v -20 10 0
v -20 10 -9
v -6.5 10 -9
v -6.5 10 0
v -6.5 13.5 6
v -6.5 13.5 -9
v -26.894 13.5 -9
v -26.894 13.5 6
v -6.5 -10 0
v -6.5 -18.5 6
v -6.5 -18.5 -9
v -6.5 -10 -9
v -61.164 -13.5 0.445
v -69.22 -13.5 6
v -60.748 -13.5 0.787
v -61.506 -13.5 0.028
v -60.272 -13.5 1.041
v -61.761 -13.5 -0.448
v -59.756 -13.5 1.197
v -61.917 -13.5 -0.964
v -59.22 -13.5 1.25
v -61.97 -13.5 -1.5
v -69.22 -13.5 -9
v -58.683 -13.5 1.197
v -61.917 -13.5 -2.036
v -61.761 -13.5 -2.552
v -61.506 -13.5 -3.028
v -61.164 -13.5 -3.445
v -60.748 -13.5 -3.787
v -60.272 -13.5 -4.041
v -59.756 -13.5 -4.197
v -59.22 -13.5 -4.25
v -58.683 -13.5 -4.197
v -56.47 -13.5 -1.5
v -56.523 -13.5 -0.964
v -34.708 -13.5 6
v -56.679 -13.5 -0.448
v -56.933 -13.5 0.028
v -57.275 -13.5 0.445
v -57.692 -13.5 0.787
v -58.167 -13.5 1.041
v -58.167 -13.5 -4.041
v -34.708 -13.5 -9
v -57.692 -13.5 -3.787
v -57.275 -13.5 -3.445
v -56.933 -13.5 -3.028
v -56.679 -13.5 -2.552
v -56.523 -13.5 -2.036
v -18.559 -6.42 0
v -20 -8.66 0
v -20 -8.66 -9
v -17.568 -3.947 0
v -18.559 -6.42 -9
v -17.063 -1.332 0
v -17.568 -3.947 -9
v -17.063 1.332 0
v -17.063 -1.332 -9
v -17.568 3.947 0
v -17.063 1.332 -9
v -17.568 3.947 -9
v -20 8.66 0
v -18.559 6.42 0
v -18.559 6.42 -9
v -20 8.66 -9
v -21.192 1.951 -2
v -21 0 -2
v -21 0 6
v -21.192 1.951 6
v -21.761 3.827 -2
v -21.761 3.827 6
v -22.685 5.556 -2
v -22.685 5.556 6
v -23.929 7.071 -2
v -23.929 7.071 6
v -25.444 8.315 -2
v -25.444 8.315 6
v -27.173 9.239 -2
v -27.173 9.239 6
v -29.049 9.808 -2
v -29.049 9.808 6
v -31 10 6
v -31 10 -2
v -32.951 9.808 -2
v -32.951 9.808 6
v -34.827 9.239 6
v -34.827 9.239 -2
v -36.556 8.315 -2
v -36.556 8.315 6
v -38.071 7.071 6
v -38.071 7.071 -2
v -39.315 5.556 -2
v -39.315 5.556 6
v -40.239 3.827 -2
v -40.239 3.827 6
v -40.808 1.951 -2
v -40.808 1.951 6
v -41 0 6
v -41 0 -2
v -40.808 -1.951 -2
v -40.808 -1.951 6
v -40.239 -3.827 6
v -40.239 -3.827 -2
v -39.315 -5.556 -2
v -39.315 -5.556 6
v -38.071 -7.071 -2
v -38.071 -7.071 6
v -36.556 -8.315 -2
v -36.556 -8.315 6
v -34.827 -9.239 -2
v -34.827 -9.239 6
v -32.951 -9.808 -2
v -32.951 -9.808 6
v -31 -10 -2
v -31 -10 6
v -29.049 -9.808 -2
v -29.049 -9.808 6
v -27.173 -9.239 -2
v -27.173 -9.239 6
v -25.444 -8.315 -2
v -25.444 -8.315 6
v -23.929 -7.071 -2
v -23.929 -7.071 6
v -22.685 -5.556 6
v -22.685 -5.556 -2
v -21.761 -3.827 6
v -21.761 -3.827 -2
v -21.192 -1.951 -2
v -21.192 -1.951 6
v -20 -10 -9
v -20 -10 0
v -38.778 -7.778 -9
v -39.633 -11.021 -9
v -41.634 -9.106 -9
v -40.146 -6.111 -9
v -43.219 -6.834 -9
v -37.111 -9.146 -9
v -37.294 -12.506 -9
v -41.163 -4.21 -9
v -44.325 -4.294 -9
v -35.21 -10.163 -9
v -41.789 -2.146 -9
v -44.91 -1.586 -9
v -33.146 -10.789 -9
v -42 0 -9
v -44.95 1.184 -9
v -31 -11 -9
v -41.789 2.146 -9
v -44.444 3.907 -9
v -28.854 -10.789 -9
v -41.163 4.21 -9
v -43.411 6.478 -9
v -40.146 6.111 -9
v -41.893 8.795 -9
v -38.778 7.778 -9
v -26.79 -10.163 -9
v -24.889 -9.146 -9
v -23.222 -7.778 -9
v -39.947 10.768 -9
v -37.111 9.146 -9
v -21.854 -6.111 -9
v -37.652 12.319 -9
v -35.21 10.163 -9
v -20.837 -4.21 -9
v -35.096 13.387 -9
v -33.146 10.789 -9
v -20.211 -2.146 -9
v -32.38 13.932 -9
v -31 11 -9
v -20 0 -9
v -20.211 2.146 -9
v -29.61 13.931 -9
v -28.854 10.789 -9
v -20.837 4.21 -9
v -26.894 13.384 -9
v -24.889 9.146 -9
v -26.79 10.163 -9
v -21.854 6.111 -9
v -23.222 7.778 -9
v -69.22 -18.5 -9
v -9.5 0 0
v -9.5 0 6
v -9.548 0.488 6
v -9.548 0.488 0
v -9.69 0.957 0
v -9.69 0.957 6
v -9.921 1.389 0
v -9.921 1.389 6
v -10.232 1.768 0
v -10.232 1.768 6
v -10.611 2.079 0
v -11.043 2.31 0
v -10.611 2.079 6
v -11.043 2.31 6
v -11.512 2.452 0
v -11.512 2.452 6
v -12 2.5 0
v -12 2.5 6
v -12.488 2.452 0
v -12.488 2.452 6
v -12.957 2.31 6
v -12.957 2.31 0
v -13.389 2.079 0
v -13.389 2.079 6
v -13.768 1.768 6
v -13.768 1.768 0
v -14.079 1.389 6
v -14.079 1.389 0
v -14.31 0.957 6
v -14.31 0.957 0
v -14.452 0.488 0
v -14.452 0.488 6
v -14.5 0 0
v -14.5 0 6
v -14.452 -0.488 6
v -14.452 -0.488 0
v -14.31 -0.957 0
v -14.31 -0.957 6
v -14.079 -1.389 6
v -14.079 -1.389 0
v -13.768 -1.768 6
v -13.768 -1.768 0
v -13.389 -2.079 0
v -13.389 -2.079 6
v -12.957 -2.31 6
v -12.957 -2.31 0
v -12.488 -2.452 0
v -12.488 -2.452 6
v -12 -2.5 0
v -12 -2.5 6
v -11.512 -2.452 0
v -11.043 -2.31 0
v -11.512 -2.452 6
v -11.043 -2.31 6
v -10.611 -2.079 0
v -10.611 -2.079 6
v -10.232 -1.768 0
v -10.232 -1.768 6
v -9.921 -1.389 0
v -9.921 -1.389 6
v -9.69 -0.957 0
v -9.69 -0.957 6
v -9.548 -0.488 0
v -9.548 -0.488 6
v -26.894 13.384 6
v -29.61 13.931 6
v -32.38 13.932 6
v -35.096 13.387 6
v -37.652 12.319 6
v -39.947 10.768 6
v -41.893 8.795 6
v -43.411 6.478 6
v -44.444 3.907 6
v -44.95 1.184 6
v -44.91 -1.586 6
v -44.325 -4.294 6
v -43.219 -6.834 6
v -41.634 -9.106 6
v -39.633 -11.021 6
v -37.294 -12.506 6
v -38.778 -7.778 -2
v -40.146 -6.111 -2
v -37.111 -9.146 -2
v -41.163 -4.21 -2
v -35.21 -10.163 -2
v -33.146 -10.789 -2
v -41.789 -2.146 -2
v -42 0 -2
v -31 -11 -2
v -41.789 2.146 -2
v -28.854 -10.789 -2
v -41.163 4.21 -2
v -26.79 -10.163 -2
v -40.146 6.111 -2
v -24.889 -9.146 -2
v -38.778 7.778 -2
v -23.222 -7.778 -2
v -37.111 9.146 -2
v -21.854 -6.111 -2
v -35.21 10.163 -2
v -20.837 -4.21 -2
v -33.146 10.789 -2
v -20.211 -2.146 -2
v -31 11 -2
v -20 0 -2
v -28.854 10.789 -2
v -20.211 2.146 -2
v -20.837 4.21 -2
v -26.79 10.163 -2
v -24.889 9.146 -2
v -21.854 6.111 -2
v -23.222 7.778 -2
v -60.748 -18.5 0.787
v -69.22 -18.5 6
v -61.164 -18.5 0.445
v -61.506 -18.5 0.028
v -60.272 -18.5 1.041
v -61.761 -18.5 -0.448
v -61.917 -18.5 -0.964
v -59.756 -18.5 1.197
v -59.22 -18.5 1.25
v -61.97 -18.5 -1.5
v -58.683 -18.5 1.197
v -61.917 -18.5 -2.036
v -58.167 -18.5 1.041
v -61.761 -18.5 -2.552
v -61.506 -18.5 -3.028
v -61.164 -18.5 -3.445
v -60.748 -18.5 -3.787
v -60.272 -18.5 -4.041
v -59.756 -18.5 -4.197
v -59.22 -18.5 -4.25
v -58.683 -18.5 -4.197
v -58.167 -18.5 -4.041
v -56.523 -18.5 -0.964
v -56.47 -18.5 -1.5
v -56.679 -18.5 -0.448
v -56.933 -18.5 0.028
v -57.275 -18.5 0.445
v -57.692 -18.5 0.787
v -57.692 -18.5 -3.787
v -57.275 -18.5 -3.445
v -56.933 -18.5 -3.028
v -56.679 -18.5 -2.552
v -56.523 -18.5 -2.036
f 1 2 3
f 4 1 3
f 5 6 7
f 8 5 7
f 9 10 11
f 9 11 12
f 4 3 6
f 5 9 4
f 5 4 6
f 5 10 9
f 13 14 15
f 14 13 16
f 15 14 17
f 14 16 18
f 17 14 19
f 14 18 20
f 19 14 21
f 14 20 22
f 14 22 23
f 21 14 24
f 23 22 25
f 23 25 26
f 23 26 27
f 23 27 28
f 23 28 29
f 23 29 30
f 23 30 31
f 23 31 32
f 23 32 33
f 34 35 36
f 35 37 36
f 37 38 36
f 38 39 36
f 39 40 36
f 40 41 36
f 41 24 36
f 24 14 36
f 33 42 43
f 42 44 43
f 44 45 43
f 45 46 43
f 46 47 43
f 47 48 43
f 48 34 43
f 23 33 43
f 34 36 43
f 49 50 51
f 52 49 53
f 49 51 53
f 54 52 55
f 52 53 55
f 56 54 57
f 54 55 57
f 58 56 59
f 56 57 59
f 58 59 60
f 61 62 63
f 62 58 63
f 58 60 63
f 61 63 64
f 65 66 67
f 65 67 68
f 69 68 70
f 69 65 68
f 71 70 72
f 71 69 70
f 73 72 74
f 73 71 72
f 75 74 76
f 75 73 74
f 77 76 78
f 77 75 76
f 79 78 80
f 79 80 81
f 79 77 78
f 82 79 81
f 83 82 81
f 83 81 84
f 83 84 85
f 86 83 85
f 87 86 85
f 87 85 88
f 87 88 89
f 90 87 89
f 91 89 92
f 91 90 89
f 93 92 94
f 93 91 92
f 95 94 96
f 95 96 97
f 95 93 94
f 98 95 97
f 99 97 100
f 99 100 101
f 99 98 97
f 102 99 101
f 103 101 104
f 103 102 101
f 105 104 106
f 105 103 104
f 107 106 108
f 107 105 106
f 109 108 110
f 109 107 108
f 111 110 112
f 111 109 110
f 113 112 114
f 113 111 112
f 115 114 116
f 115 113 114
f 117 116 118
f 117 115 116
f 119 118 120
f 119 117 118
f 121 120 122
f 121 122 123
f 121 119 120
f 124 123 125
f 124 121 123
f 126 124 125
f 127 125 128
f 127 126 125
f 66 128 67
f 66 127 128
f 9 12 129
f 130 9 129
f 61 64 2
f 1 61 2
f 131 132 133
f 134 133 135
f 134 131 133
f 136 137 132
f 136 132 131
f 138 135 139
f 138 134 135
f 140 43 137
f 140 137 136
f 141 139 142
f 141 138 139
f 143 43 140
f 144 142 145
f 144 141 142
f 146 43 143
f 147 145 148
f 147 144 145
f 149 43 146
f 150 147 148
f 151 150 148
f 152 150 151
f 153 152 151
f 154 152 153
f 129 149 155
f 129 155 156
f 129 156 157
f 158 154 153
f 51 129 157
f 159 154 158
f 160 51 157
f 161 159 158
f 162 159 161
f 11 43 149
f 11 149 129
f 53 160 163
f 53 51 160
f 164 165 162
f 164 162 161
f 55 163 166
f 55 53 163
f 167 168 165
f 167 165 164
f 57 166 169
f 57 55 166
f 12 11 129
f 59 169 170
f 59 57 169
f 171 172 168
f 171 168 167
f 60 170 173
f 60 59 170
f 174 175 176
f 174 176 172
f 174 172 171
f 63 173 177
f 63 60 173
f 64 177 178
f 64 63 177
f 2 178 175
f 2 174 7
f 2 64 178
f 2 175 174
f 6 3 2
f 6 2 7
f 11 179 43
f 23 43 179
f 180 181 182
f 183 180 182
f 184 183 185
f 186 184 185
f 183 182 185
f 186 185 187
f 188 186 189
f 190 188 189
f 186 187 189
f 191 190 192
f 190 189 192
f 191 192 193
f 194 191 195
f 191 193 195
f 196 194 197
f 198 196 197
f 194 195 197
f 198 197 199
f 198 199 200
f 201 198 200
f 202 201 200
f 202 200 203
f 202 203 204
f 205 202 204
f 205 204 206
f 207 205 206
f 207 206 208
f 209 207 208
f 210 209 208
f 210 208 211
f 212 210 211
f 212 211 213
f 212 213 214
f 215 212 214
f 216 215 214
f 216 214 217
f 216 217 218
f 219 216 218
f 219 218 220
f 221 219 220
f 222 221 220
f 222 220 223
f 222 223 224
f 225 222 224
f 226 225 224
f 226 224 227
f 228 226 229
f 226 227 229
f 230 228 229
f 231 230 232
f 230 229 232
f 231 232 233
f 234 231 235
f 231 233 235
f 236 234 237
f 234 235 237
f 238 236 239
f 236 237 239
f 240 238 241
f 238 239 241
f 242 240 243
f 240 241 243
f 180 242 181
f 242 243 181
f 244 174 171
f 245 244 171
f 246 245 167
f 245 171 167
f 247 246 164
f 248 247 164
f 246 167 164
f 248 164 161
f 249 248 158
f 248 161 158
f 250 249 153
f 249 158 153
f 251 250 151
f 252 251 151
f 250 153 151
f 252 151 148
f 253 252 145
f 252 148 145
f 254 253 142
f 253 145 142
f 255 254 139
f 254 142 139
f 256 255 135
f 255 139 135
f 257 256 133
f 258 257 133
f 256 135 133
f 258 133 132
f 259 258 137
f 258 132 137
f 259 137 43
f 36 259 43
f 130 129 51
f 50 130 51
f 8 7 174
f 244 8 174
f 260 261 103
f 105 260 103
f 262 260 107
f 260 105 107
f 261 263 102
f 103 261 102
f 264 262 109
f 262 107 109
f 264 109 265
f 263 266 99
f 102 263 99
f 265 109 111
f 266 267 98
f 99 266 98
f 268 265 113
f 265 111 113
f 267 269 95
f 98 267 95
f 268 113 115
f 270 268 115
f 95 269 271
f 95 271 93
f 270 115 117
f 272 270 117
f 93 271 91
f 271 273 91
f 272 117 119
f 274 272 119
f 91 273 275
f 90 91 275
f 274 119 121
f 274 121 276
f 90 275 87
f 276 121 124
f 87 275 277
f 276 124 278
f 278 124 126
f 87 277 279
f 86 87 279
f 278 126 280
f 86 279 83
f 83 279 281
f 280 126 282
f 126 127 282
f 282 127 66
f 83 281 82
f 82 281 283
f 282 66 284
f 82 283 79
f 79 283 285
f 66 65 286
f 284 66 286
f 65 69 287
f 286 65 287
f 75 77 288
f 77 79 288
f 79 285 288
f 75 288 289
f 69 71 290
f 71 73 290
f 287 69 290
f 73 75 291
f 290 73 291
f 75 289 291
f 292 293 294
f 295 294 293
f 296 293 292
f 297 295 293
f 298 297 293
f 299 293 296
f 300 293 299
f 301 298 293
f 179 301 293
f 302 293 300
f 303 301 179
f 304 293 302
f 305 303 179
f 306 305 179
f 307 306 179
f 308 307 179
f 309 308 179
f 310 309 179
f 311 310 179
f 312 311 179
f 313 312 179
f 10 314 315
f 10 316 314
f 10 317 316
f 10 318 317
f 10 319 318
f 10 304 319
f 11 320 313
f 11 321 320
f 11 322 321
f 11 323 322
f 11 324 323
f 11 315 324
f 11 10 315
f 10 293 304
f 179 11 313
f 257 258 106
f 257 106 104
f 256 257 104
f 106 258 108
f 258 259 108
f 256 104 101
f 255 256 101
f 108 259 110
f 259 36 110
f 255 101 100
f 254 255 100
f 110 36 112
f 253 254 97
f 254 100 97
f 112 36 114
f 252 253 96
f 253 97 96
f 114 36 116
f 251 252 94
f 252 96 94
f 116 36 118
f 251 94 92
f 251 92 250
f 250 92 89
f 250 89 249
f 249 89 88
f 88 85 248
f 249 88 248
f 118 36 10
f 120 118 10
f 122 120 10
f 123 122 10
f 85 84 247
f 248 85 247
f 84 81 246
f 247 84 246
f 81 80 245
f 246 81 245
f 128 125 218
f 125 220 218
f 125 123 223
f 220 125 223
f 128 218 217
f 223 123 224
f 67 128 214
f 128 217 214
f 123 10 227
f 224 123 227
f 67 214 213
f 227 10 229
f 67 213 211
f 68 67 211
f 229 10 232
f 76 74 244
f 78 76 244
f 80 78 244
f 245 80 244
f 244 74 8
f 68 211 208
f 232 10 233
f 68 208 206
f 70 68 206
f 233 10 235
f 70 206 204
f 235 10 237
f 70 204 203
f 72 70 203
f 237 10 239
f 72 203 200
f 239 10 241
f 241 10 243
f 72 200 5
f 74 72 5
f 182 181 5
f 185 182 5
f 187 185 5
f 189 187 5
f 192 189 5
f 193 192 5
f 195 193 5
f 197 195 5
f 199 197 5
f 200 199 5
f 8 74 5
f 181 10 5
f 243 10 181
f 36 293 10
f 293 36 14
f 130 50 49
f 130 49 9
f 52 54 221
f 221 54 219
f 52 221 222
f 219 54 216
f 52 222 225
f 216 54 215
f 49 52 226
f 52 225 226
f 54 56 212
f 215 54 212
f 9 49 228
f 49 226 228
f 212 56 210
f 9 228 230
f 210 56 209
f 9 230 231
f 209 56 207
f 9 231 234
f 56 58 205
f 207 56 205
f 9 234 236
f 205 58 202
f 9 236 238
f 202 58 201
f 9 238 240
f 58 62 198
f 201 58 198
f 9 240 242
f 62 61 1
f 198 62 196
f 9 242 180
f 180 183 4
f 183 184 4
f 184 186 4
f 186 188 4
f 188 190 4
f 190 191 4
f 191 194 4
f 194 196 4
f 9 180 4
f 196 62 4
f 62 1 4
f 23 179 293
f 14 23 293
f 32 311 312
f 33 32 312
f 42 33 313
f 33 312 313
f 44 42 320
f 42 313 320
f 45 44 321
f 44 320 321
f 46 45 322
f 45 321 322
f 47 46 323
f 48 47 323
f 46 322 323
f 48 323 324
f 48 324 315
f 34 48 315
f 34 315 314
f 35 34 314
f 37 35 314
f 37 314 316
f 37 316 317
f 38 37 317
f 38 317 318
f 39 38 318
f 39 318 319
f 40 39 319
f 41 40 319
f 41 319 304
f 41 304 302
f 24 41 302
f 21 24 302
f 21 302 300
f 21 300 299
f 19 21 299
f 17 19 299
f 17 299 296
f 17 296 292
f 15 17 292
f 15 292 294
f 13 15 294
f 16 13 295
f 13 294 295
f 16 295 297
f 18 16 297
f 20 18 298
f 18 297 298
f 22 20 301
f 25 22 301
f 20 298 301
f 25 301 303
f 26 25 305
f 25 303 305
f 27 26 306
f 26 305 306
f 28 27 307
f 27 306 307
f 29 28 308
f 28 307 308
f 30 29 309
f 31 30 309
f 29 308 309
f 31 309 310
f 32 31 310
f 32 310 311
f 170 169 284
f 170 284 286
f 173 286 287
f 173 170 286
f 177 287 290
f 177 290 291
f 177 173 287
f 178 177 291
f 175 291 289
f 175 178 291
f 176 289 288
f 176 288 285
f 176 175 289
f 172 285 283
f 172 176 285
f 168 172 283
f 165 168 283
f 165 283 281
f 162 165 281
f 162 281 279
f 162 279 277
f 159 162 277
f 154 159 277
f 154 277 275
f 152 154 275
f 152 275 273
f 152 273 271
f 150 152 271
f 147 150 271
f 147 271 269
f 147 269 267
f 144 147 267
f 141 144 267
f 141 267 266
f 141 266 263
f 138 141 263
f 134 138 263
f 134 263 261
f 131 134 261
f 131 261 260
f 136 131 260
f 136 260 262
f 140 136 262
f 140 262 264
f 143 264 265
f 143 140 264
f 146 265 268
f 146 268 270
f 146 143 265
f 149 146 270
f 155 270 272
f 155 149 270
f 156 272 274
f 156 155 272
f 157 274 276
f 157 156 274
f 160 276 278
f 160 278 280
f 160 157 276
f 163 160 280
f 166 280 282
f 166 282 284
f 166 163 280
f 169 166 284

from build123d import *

# Parameters (mm, degrees)
SKETCH_1_W          = 40
SKETCH_1_H          = 20
EXTRUDE_1_DEPTH     = 6
SKETCH_2_R          = 2.5
CUT_EXTRUDE_1_DEPTH = 24.151673806
EXTRUDE_START       = -15
EXTRUDE_2_OUTLINE_R = 11
EXTRUDE_2_DEPTH     = 15
EXTRUDE_START_2     = -8
SKETCH_5_R          = 11
SKETCH_5_R_2        = 10
EXTRUDE_3_DEPTH     = 8
SKETCH_10_W         = 15
SKETCH_10_H         = 5
EXTRUDE_4_DEPTH     = 500
SKETCH_11_W         = 11.491200589
SKETCH_11_H         = 5.122583395
EXTRUDE_5_DEPTH     = 15
SKETCH_12_W         = 26.5
SKETCH_12_H         = 32
CUT_EXTRUDE_2_DEPTH = 481.59052217
SKETCH_14_W         = 424.807672393
SKETCH_14_H         = 21.861471412
CUT_EXTRUDE_3_DEPTH = 482.183177179
SKETCH_15_R         = 2.75
CUT_EXTRUDE_4_DEPTH = 10


# Read off the part's stored shape, not the designer's step: 凸台-拉伸2
with BuildPart() as part:
    # 草图1 → 凸台-拉伸1 (new body)
    with BuildSketch(Plane.XY):
        Rectangle(SKETCH_1_W, SKETCH_1_H)
    extrude(amount=EXTRUDE_1_DEPTH)

    # 草图2 → 切除-拉伸1 (cut, through all)
    with BuildSketch(Plane.XY.offset(6)):
        with Locations((10, 0)):
            Circle(SKETCH_2_R)
        with Locations((-1, 0)):
            Circle(SKETCH_2_R)
        with Locations((-12, 0)):
            Circle(SKETCH_2_R)
    extrude(amount=-CUT_EXTRUDE_1_DEPTH, mode=Mode.SUBTRACT)

    # 凸台-拉伸2 outline → 凸台-拉伸2 (add)
    with BuildSketch(Plane.XY.offset(6).offset(EXTRUDE_START)):
        with BuildLine():
            Line((20, 10), (20, 13.5))
            Line((20, 13.5), (-26.893967141, 13.5))
            Line((-26.893967141, 13.5), (-26.893967141, 13.384337644))
            ThreePointArc((-26.893967141, 13.384337644), (-45, 0), (-26.893967141, -13.384337644))
            Line((-26.893967141, -13.384337644), (-26.893967141, -13.5))
            Line((-26.893967141, -13.5), (20, -13.5))
            Line((20, -13.5), (20, -10))
            Line((20, -10), (-20, -10))
            Line((-20, -10), (-20, -8.660254038))
            ThreePointArc((-20, -8.660254038), (-17, 0), (-20, 8.660254038))
            Line((-20, 8.660254038), (-20, 10))
            Line((-20, 10), (20, 10))
        make_face()
        with Locations((-31, 0)):
            Circle(EXTRUDE_2_OUTLINE_R, mode=Mode.SUBTRACT)
    extrude(amount=EXTRUDE_2_DEPTH)

    # 草图5 → 凸台-拉伸3 (add)
    with BuildSketch(Plane.XY.offset(6).offset(EXTRUDE_START_2)):
        with Locations((-31, 0)):
            Circle(SKETCH_5_R)
        with Locations((-31, 0)):
            Circle(SKETCH_5_R_2, mode=Mode.SUBTRACT)
    extrude(amount=EXTRUDE_3_DEPTH)

    # 草图10 → 凸台-拉伸4 (add)
    with BuildSketch(Plane(origin=(20, 0, 0), x_dir=(0, 0, -1), z_dir=(1, 0, 0))):
        with Locations((1.5, -16)):
            Rectangle(SKETCH_10_W, SKETCH_10_H)
    extrude(amount=-EXTRUDE_4_DEPTH)

    # 草图11 → 凸台-拉伸5 (add, through all)
    with BuildSketch(Plane(origin=(0, 0, -9), x_dir=(-1, 0, 0), z_dir=(0, 0, -1))):
        with Locations((27.78271332, -13.925059853)):
            Rectangle(SKETCH_11_W, SKETCH_11_H)
    extrude(amount=-EXTRUDE_5_DEPTH)

    # 草图12 → 切除-拉伸2 (cut, through all)
    with BuildSketch(Plane.XY.offset(6)):
        with Locations((6.75, -2.5)):
            Rectangle(SKETCH_12_W, SKETCH_12_H)
    extrude(amount=-CUT_EXTRUDE_2_DEPTH, mode=Mode.SUBTRACT)

    # 草图14 → 切除-拉伸3 (cut, through all)
    with BuildSketch(Plane.XZ.offset(18.5)):
        with Locations((-281.623673677, 1.881654976)):
            Rectangle(SKETCH_14_W, SKETCH_14_H)
    extrude(amount=-CUT_EXTRUDE_3_DEPTH, mode=Mode.SUBTRACT)

    # 草图15 → 切除-拉伸4 (cut)
    with BuildSketch(Plane.XZ.offset(18.5)):
        with Locations(Location((-59.219837481, -1.5, 0), (0, 0, 270))):
            Circle(SKETCH_15_R)
    extrude(amount=-CUT_EXTRUDE_4_DEPTH, mode=Mode.SUBTRACT)


solid = part.part
